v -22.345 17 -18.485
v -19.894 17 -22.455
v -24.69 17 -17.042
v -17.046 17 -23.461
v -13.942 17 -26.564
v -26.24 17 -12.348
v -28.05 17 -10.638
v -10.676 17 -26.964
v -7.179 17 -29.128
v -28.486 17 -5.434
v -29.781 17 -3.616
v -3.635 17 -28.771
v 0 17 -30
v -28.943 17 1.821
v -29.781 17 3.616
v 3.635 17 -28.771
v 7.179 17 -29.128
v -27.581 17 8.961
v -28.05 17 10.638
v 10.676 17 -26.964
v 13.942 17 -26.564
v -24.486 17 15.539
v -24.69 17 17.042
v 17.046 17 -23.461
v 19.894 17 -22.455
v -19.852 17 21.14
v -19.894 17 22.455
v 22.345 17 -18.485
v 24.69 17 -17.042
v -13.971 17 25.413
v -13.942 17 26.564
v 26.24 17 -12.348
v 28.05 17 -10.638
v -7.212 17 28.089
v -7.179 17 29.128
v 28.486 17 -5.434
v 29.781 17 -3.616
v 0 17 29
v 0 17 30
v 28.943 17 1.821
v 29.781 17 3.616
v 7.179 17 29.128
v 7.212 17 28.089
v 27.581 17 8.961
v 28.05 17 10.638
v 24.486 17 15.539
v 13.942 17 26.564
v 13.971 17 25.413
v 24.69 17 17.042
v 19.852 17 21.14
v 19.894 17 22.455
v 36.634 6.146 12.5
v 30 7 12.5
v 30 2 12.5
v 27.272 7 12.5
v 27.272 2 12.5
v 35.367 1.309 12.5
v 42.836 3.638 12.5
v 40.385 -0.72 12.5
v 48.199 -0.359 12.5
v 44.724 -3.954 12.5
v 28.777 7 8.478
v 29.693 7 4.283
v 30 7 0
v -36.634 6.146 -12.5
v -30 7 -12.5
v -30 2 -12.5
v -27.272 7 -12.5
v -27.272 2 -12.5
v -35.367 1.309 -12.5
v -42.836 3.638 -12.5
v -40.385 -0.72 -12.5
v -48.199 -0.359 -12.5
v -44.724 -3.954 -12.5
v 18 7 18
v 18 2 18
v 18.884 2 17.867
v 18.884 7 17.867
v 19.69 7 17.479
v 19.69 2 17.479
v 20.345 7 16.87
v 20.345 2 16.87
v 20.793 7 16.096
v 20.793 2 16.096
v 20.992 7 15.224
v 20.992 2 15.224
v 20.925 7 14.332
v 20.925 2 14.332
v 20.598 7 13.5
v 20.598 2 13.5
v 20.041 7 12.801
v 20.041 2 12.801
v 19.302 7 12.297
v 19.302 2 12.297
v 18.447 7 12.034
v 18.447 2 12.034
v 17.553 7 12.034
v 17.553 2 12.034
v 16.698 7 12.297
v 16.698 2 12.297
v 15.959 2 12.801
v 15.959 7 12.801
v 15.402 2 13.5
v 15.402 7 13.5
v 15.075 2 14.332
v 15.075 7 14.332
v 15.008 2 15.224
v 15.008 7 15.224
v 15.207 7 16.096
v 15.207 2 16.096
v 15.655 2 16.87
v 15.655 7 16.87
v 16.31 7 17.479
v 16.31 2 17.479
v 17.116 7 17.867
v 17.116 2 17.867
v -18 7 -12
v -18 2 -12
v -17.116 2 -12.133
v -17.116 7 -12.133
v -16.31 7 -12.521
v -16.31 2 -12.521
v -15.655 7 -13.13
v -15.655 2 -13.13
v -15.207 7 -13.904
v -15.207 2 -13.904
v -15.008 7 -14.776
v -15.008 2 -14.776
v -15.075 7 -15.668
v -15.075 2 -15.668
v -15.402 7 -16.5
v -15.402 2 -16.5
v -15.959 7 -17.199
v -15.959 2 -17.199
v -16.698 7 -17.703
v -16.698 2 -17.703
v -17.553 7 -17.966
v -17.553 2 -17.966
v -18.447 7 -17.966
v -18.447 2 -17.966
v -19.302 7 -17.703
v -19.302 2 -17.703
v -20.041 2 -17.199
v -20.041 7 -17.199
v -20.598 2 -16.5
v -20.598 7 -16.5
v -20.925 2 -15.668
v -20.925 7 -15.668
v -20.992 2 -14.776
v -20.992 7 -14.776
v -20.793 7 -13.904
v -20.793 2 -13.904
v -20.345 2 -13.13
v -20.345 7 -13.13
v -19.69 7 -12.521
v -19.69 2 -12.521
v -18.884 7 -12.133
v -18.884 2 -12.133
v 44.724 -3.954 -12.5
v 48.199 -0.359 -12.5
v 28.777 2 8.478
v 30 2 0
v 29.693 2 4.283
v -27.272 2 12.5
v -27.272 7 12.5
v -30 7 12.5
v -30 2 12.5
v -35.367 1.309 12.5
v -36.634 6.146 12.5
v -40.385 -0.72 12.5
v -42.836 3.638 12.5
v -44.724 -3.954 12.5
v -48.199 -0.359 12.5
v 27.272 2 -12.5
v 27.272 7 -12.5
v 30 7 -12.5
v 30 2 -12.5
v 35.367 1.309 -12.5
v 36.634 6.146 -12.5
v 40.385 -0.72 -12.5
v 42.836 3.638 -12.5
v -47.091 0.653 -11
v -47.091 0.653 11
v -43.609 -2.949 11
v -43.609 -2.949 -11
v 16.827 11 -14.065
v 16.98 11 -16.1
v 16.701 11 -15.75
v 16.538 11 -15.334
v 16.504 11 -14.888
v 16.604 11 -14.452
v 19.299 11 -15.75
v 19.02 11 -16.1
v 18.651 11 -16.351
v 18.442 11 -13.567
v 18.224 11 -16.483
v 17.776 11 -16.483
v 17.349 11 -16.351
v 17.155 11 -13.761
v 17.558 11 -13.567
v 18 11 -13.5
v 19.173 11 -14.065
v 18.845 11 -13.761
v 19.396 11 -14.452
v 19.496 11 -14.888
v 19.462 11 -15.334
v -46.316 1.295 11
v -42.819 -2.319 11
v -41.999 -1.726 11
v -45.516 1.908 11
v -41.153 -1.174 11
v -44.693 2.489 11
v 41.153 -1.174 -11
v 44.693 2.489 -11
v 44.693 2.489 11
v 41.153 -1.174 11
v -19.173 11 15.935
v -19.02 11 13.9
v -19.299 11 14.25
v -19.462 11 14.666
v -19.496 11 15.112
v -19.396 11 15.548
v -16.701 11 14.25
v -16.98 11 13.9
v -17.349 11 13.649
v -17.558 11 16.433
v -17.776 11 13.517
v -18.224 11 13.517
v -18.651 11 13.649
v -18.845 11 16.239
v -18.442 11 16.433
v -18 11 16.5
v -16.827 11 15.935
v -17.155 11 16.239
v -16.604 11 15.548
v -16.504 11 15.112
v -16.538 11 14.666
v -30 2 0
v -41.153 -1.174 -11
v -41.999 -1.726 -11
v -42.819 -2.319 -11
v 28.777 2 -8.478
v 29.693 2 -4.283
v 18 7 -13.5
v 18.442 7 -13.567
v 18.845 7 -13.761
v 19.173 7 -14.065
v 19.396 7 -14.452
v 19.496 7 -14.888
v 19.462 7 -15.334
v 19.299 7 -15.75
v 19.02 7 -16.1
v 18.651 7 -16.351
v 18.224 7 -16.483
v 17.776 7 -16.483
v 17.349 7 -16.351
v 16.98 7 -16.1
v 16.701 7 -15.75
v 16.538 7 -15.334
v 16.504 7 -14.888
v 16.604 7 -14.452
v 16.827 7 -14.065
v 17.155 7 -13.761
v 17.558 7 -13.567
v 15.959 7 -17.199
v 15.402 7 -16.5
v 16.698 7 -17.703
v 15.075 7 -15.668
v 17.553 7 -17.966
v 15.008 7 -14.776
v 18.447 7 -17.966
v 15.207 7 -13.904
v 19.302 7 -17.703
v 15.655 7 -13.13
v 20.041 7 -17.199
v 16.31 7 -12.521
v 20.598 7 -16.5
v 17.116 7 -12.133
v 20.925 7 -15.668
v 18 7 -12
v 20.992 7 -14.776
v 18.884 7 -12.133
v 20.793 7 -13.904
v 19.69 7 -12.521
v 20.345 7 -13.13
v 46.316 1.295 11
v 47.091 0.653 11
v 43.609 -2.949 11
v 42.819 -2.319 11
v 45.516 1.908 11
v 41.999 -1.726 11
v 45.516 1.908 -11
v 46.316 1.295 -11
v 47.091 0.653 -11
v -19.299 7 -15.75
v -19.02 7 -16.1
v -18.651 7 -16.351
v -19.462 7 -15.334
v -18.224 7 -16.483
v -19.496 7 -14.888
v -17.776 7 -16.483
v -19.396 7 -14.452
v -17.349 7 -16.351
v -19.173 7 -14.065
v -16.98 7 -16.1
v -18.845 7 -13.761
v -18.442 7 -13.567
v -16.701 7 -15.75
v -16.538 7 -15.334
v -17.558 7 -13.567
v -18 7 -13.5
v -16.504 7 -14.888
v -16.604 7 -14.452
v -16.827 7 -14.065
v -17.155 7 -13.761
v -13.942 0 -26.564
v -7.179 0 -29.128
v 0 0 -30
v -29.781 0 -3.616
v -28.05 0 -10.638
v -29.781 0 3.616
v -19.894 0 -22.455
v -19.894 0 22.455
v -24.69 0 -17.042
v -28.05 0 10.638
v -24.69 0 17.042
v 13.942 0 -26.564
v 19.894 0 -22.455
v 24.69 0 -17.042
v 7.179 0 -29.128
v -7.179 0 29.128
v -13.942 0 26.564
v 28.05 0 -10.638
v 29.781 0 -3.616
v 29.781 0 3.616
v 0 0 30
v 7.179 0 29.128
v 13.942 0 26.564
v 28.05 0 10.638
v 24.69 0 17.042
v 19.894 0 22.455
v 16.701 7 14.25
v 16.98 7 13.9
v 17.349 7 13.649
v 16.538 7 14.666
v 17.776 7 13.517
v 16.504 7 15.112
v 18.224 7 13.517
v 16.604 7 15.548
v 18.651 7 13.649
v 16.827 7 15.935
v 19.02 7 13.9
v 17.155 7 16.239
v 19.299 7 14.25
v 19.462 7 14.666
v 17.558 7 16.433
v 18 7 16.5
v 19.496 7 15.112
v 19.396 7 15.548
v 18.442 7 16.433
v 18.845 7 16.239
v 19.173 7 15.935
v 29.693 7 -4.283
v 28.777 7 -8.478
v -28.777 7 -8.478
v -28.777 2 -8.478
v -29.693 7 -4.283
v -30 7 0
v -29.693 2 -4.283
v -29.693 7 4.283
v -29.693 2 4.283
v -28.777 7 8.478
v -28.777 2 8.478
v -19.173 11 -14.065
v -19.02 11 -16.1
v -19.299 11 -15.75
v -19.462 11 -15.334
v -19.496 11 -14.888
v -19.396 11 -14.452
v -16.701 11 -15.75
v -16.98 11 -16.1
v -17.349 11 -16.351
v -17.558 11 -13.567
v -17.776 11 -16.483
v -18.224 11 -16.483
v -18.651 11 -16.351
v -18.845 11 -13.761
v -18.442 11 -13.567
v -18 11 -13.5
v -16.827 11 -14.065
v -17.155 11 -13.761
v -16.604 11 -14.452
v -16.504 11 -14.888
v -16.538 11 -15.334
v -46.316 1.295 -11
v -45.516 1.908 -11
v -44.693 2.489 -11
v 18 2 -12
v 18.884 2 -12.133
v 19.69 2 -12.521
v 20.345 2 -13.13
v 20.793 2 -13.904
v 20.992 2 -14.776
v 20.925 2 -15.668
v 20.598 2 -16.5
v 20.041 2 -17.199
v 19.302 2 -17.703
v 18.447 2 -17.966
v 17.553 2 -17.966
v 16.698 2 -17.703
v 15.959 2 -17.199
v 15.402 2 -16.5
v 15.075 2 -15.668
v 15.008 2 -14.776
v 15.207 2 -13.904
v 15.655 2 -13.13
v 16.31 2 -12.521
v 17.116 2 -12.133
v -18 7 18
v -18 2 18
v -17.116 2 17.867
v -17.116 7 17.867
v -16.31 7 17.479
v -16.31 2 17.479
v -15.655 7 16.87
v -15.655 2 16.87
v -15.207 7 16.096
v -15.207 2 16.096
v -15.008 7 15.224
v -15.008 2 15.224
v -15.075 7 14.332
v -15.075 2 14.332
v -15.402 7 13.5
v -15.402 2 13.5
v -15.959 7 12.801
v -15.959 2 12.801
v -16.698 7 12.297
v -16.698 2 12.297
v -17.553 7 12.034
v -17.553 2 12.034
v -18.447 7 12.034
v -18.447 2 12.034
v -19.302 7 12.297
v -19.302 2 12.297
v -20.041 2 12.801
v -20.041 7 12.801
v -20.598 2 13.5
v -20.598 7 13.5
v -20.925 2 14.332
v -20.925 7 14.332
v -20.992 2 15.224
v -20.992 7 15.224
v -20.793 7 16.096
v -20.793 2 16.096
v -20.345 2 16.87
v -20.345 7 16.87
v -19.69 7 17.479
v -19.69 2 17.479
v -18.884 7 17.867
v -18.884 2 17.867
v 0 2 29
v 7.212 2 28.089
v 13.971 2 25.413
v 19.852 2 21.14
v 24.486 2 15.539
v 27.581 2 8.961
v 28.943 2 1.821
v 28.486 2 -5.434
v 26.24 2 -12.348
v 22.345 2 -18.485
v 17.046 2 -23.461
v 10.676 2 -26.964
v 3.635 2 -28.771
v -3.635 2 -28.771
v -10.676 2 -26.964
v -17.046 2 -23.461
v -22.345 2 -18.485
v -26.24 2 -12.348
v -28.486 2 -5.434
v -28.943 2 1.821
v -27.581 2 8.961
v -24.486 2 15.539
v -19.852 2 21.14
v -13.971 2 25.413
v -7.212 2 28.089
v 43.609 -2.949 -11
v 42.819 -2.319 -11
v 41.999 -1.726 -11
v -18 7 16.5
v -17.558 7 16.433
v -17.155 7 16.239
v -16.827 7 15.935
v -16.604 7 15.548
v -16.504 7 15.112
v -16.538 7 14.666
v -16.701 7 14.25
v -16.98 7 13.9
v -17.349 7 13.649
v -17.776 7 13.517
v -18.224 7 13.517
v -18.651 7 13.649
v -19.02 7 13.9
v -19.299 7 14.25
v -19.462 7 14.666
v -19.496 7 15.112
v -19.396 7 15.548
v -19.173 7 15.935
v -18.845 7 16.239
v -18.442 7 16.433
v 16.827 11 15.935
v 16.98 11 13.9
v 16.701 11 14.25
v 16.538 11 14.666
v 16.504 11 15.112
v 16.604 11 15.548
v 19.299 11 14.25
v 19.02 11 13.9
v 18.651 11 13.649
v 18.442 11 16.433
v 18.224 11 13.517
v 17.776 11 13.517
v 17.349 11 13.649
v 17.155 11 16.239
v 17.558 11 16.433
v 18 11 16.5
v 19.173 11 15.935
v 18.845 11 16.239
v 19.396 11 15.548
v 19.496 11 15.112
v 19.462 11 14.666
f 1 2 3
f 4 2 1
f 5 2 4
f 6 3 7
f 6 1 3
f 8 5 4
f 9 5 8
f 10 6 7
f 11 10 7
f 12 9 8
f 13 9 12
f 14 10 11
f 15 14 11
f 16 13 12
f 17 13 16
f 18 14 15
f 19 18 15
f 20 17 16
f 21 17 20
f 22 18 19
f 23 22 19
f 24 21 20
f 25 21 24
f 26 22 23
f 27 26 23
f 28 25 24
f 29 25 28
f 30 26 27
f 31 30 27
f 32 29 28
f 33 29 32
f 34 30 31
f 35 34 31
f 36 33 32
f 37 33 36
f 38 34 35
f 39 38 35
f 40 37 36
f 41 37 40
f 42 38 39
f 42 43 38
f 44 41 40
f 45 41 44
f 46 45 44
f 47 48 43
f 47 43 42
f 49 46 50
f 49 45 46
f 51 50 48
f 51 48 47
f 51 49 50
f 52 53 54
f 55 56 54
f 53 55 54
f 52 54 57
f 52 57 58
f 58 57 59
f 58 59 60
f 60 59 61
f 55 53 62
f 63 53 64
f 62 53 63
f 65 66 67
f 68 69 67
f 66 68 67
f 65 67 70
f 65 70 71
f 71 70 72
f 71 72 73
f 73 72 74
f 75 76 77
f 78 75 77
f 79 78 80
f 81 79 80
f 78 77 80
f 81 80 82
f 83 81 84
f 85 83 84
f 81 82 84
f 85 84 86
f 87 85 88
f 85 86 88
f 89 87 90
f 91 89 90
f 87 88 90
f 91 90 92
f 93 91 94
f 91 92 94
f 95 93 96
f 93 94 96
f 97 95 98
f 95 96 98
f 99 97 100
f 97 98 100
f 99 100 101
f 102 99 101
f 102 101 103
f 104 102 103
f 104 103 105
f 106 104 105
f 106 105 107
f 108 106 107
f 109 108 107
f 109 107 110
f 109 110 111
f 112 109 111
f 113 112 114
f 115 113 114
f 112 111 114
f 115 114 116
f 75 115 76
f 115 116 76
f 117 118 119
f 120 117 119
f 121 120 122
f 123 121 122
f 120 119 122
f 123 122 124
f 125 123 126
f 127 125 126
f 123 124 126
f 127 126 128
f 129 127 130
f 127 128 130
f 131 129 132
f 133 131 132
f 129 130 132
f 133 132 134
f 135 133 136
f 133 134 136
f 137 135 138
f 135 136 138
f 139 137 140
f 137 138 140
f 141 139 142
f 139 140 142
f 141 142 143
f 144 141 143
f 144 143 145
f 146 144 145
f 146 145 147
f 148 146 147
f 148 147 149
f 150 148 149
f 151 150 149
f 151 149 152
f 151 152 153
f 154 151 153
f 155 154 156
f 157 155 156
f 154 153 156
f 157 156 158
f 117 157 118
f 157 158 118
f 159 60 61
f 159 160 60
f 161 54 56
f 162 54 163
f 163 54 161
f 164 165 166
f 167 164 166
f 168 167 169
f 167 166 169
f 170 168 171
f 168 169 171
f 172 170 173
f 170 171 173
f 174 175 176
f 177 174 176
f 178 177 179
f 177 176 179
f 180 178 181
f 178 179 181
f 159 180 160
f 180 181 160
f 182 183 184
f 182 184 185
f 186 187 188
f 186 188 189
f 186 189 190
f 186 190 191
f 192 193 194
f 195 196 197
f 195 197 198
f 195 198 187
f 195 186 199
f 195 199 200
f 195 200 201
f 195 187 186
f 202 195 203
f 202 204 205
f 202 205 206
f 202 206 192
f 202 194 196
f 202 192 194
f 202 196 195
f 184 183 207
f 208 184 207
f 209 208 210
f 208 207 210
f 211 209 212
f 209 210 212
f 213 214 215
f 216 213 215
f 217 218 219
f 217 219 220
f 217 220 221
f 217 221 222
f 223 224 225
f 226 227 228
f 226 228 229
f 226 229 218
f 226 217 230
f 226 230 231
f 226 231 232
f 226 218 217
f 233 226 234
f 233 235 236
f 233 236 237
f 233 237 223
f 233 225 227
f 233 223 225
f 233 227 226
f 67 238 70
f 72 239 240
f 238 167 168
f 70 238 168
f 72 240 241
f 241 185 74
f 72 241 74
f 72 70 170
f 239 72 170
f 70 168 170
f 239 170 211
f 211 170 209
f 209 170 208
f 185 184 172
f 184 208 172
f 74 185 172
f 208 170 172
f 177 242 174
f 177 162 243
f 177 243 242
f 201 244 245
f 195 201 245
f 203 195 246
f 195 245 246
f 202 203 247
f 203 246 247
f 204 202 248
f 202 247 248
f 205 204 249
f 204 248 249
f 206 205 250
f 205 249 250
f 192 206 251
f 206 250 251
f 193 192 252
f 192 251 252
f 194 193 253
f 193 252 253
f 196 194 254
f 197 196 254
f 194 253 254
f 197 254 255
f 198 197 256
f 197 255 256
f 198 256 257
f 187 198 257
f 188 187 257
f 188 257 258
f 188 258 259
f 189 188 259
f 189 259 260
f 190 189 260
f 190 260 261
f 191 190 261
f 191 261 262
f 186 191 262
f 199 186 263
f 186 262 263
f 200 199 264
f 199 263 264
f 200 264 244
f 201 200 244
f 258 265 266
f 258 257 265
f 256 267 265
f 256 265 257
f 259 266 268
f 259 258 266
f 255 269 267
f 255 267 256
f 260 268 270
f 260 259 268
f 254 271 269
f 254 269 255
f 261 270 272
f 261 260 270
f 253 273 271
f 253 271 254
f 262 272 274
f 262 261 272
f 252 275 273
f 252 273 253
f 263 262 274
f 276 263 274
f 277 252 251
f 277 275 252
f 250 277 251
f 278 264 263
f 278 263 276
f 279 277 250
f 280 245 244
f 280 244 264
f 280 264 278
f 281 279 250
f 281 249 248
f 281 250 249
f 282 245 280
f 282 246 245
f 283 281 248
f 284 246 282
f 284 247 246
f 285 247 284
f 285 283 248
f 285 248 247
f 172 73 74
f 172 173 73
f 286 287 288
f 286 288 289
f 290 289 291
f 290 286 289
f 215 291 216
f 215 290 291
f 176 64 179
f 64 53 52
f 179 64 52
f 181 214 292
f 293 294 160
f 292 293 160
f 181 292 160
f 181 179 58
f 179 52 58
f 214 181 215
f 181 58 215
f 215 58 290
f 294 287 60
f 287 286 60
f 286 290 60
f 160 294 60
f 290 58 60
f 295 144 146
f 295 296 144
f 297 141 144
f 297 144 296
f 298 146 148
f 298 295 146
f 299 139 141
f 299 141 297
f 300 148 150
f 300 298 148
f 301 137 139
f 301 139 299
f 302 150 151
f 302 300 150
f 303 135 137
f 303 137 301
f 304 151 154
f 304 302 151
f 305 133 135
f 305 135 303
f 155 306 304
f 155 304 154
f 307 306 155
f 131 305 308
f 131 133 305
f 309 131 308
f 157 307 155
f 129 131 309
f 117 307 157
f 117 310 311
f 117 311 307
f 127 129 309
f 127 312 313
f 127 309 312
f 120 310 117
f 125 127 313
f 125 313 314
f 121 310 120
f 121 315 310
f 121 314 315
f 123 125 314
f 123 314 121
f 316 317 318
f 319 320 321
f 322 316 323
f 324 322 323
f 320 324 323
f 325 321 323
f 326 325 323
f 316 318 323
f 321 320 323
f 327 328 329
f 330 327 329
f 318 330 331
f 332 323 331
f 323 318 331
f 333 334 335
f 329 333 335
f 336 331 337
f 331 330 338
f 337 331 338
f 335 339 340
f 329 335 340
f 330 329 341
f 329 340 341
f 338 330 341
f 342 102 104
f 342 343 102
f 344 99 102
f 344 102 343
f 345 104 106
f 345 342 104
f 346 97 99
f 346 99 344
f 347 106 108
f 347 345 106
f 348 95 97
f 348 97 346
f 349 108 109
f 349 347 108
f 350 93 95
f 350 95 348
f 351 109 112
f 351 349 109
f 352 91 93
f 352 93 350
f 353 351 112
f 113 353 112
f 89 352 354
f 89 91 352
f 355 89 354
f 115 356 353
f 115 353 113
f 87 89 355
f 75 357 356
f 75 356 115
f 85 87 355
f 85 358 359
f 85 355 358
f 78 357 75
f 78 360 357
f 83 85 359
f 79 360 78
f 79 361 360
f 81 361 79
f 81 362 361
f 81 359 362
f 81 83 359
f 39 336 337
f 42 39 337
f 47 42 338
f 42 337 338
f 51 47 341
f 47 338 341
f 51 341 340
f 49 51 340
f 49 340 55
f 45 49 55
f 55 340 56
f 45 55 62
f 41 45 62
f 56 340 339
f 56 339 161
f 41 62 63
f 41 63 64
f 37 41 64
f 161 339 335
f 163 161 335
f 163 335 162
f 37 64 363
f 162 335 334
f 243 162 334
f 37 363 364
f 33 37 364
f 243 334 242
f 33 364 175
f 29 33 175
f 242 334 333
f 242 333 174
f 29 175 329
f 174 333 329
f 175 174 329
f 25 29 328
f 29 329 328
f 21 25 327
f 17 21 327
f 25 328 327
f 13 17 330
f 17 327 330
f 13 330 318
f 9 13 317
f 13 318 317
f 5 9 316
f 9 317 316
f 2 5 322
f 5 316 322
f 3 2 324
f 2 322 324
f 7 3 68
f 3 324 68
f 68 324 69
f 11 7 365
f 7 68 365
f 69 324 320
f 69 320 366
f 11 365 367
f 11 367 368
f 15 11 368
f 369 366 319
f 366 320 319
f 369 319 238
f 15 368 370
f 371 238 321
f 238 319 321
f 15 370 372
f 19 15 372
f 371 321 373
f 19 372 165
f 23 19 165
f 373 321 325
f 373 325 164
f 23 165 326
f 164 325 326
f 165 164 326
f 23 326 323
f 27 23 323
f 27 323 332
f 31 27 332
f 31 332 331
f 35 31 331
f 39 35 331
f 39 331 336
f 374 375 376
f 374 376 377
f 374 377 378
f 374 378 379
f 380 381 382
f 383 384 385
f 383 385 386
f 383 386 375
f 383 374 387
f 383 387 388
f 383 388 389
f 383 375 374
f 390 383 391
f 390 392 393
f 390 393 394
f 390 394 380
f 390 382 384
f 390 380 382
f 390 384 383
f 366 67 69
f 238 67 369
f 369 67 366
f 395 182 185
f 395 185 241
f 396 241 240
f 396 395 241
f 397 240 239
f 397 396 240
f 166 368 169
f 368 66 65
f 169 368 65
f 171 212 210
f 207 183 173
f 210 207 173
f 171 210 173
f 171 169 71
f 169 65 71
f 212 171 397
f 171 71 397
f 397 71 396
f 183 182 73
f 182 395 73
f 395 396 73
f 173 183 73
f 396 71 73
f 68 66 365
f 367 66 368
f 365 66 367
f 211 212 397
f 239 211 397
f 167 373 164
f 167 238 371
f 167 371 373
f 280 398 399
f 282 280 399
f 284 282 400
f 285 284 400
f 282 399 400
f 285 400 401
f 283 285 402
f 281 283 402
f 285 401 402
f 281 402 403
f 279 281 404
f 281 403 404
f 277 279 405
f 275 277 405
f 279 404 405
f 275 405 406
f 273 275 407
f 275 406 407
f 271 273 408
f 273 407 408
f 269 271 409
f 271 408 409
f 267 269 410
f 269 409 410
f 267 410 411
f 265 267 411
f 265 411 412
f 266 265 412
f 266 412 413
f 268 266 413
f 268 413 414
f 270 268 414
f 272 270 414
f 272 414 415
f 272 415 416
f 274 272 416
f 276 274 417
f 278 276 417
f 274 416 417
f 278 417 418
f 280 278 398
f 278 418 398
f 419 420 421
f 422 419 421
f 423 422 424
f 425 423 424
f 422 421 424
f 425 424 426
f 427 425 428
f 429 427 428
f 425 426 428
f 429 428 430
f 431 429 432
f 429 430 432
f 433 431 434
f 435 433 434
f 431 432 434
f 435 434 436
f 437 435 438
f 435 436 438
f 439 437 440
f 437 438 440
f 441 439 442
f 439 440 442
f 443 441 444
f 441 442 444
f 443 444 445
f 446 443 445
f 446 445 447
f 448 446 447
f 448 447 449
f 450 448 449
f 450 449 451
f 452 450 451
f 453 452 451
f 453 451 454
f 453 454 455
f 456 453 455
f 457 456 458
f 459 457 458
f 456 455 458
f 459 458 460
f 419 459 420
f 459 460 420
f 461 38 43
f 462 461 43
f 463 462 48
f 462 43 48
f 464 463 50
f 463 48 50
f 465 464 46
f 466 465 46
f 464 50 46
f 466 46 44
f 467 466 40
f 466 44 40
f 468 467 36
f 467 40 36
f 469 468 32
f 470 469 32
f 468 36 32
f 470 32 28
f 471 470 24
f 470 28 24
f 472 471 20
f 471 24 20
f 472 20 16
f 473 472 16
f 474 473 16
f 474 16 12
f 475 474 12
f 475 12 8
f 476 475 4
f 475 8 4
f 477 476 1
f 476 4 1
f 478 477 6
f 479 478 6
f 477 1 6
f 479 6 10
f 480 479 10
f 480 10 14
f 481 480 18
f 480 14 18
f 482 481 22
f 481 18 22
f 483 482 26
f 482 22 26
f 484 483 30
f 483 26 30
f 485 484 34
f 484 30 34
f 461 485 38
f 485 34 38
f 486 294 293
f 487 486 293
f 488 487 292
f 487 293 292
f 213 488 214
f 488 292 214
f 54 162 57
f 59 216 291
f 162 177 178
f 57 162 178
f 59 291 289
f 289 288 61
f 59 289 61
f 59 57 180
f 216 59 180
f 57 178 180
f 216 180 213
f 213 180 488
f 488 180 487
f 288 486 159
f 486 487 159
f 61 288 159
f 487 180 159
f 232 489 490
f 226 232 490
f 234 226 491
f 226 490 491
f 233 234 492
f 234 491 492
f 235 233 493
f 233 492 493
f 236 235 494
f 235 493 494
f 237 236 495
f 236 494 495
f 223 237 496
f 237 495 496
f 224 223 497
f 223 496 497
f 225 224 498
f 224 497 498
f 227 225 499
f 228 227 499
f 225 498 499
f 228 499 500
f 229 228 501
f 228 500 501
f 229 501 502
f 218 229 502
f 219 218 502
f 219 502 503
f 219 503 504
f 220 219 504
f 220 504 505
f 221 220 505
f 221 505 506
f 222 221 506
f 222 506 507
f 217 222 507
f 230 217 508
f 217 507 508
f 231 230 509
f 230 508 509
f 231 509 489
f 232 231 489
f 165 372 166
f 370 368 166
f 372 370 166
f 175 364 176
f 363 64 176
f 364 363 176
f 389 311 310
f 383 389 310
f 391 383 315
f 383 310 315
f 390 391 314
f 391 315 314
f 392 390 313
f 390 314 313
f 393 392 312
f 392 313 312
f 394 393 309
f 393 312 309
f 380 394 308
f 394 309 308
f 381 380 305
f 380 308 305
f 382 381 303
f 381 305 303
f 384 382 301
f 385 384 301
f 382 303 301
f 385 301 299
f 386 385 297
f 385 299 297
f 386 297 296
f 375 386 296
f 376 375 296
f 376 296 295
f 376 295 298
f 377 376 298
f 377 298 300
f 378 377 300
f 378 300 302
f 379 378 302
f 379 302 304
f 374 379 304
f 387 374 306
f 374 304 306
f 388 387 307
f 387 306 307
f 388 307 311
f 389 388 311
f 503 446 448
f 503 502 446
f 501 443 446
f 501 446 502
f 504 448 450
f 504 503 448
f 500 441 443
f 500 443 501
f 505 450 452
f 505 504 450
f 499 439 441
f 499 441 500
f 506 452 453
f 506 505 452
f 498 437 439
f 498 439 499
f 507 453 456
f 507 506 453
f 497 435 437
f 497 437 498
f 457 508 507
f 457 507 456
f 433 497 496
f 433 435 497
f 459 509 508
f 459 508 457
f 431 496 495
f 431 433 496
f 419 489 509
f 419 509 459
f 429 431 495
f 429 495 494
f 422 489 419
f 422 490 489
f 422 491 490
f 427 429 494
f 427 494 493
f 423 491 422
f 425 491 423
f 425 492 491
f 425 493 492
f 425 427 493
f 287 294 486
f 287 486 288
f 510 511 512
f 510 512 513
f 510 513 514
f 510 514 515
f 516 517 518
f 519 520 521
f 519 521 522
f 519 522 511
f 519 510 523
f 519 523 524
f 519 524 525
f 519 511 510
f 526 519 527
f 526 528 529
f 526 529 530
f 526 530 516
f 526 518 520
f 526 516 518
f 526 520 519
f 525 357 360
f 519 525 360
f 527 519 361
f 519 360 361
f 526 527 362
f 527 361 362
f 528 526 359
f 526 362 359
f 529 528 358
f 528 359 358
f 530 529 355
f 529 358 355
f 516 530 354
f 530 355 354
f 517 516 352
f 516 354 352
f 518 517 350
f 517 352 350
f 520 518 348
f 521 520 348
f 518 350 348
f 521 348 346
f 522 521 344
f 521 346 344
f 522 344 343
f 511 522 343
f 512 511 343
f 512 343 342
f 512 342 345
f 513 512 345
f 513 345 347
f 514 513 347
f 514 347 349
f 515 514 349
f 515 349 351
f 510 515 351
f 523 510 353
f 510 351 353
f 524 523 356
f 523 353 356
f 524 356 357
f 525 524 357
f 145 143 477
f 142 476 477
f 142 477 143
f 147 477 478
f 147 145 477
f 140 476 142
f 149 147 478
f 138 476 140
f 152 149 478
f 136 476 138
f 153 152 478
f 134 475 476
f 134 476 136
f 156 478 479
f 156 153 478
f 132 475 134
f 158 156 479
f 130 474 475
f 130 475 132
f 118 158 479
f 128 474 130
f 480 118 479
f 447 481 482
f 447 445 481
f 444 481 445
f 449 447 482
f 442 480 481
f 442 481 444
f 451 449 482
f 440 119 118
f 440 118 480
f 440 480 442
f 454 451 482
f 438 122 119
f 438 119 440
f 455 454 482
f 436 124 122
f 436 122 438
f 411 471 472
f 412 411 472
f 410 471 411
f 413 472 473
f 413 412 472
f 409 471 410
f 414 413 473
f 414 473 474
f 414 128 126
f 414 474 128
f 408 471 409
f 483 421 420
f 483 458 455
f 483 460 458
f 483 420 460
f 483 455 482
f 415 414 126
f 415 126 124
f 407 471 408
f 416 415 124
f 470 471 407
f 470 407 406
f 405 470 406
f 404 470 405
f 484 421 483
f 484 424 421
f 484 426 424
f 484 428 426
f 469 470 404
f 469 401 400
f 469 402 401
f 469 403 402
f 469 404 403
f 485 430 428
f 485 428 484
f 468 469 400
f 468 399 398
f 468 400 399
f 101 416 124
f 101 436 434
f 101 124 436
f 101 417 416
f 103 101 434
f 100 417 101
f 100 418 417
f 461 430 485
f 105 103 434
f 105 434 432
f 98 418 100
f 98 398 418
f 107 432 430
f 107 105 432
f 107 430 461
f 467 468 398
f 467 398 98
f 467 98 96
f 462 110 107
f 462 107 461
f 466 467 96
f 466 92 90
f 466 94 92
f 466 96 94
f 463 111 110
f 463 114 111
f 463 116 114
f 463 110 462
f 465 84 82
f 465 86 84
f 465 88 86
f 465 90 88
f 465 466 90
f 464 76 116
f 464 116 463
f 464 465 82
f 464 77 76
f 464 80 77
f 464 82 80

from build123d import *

# Parameters (mm, degrees)
SKETCH1_R                = 30
BOSS_EXTRUDE1_DEPTH      = 17
SKETCH2_R                = 29
CUT_EXTRUDE1_DEPTH       = 15
SKETCH3_R                = 3
BOSS_EXTRUDE5_DEPTH      = 5
SKETCH4_R                = 1.5
BOSS_EXTRUDE6_DEPTH      = 4
BOSS_EXTRUDE7_REACH      = 71.203
BOSS_EXTRUDE7_END_RADIUS = 30
SKETCH6_W                = 25
SKETCH6_H                = 5
SKETCH9_W                = 25
SKETCH9_H                = 5
SKETCH10_W               = 3
SKETCH10_H               = 22
CUT_EXTRUDE2_DEPTH       = 10
CIRPATTERN1_COUNT        = 2


with BuildPart() as part:
    # Sketch1 → Boss-Extrude1 (new body)
    with BuildSketch(Plane(origin=(0, 0, 0), x_dir=(1, 0, 0), z_dir=(0, 1, 0))):
        with Locations(Location((0, 0, 0), (0, 0, 270))):
            Circle(SKETCH1_R)
    extrude(amount=BOSS_EXTRUDE1_DEPTH)

    # Sketch2 → Cut-Extrude1 (cut)
    with BuildSketch(Plane(origin=(0, 17, 0), x_dir=(1, 0, 0), z_dir=(0, 1, 0))):
        with Locations(Location((0, 0, 0), (0, 0, 270))):
            Circle(SKETCH2_R)
    extrude(amount=-CUT_EXTRUDE1_DEPTH, mode=Mode.SUBTRACT)

    # Sketch3 → Boss-Extrude5 (add)
    with BuildSketch(Plane(origin=(0, 2, 0), x_dir=(1, 0, 0), z_dir=(0, 1, 0))):
        with Locations(Location((-18, 15, 0), (0, 0, 270))):
            Circle(SKETCH3_R)
        with Locations(Location((-18, -15, 0), (0, 0, 270))):
            Circle(SKETCH3_R)
        with Locations(Location((18, -15, 0), (0, 0, 270))):
            Circle(SKETCH3_R)
        with Locations(Location((18, 15, 0), (0, 0, 270))):
            Circle(SKETCH3_R)
    extrude(amount=BOSS_EXTRUDE5_DEPTH)

    # Sketch4 → Boss-Extrude6 (add)
    with BuildSketch(Plane(origin=(0, 7, 0), x_dir=(1, 0, 0), z_dir=(0, 1, 0))):
        with Locations(Location((-18, 15, 0), (0, 0, 270))):
            Circle(SKETCH4_R)
        with Locations(Location((-18, -15, 0), (0, 0, 270))):
            Circle(SKETCH4_R)
        with Locations(Location((18, 15, 0), (0, 0, 270))):
            Circle(SKETCH4_R)
        with Locations(Location((18, -15, 0), (0, 0, 270))):
            Circle(SKETCH4_R)
    extrude(amount=BOSS_EXTRUDE6_DEPTH)

    # Boss-Extrude7: up to this cylinder (the profile starts outside it)
    boss_extrude7_end = Plane(origin=(0, 4.5, 0), z_dir=(0, -1, 0)) * Cylinder(BOSS_EXTRUDE7_END_RADIUS, 203.406, mode=Mode.PRIVATE)
    # Sketch6 → Boss-Extrude7 (add, up to the surface)
    with BuildSketch(Plane.ZY.offset(30), mode=Mode.PRIVATE) as boss_extrude7_sk1:
        with Locations((0, 4.5)):
            Rectangle(SKETCH6_W, SKETCH6_H)
    boss_extrude7_tool1 = extrude(boss_extrude7_sk1.sketch, amount=-BOSS_EXTRUDE7_REACH, mode=Mode.PRIVATE) - boss_extrude7_end
    boss_extrude7 = boss_extrude7_tool1.solids().sort_by_distance((-30, 4.5, 0))[0] + boss_extrude7_tool1.solids().sort_by_distance((-30, 4.5, 0))[1]
    add(boss_extrude7)

    # Sweep1: sweep along a path in Sketch7
    with BuildLine(Plane.XY) as sweep1_path:
        ThreePointArc((-30, 4.5), (-38.878296183, 2.772912041), (-46.461716328, -2.156460621))
    # Sketch9 → Sweep1 (sweep)
    with BuildSketch(Plane.ZY.offset(30)):
        with Locations((0, 4.5)):
            Rectangle(SKETCH9_W, SKETCH9_H)
    sweep1 = sweep(path=sweep1_path.line)

    # Sketch10 → Cut-Extrude2 (cut)
    with BuildSketch(Plane(origin=(-23.106823791, 23.900351253, 0), x_dir=(0.7189410106609229, 0.6950710921839945, 0), z_dir=(-0.6950710921839945, 0.7189410106609229, 0))):
        with Locations((-31.902126733, 0)):
            Rectangle(SKETCH10_W, SKETCH10_H)
    cut_extrude2 = extrude(amount=-CUT_EXTRUDE2_DEPTH, mode=Mode.SUBTRACT)

    # CirPattern1: Boss-Extrude7, Sweep1, Cut-Extrude2 ×2 about axis
    cirpattern1_axis = Axis((0, 0, 0), (0, 1, 0))
    add([boss_extrude7.rotate(cirpattern1_axis, i * 360 / CIRPATTERN1_COUNT) for i in range(1, CIRPATTERN1_COUNT)])
    add([sweep1.rotate(cirpattern1_axis, i * 360 / CIRPATTERN1_COUNT) for i in range(1, CIRPATTERN1_COUNT)])
    add([cut_extrude2.rotate(cirpattern1_axis, i * 360 / CIRPATTERN1_COUNT) for i in range(1, CIRPATTERN1_COUNT)], mode=Mode.SUBTRACT)


solid = part.part
